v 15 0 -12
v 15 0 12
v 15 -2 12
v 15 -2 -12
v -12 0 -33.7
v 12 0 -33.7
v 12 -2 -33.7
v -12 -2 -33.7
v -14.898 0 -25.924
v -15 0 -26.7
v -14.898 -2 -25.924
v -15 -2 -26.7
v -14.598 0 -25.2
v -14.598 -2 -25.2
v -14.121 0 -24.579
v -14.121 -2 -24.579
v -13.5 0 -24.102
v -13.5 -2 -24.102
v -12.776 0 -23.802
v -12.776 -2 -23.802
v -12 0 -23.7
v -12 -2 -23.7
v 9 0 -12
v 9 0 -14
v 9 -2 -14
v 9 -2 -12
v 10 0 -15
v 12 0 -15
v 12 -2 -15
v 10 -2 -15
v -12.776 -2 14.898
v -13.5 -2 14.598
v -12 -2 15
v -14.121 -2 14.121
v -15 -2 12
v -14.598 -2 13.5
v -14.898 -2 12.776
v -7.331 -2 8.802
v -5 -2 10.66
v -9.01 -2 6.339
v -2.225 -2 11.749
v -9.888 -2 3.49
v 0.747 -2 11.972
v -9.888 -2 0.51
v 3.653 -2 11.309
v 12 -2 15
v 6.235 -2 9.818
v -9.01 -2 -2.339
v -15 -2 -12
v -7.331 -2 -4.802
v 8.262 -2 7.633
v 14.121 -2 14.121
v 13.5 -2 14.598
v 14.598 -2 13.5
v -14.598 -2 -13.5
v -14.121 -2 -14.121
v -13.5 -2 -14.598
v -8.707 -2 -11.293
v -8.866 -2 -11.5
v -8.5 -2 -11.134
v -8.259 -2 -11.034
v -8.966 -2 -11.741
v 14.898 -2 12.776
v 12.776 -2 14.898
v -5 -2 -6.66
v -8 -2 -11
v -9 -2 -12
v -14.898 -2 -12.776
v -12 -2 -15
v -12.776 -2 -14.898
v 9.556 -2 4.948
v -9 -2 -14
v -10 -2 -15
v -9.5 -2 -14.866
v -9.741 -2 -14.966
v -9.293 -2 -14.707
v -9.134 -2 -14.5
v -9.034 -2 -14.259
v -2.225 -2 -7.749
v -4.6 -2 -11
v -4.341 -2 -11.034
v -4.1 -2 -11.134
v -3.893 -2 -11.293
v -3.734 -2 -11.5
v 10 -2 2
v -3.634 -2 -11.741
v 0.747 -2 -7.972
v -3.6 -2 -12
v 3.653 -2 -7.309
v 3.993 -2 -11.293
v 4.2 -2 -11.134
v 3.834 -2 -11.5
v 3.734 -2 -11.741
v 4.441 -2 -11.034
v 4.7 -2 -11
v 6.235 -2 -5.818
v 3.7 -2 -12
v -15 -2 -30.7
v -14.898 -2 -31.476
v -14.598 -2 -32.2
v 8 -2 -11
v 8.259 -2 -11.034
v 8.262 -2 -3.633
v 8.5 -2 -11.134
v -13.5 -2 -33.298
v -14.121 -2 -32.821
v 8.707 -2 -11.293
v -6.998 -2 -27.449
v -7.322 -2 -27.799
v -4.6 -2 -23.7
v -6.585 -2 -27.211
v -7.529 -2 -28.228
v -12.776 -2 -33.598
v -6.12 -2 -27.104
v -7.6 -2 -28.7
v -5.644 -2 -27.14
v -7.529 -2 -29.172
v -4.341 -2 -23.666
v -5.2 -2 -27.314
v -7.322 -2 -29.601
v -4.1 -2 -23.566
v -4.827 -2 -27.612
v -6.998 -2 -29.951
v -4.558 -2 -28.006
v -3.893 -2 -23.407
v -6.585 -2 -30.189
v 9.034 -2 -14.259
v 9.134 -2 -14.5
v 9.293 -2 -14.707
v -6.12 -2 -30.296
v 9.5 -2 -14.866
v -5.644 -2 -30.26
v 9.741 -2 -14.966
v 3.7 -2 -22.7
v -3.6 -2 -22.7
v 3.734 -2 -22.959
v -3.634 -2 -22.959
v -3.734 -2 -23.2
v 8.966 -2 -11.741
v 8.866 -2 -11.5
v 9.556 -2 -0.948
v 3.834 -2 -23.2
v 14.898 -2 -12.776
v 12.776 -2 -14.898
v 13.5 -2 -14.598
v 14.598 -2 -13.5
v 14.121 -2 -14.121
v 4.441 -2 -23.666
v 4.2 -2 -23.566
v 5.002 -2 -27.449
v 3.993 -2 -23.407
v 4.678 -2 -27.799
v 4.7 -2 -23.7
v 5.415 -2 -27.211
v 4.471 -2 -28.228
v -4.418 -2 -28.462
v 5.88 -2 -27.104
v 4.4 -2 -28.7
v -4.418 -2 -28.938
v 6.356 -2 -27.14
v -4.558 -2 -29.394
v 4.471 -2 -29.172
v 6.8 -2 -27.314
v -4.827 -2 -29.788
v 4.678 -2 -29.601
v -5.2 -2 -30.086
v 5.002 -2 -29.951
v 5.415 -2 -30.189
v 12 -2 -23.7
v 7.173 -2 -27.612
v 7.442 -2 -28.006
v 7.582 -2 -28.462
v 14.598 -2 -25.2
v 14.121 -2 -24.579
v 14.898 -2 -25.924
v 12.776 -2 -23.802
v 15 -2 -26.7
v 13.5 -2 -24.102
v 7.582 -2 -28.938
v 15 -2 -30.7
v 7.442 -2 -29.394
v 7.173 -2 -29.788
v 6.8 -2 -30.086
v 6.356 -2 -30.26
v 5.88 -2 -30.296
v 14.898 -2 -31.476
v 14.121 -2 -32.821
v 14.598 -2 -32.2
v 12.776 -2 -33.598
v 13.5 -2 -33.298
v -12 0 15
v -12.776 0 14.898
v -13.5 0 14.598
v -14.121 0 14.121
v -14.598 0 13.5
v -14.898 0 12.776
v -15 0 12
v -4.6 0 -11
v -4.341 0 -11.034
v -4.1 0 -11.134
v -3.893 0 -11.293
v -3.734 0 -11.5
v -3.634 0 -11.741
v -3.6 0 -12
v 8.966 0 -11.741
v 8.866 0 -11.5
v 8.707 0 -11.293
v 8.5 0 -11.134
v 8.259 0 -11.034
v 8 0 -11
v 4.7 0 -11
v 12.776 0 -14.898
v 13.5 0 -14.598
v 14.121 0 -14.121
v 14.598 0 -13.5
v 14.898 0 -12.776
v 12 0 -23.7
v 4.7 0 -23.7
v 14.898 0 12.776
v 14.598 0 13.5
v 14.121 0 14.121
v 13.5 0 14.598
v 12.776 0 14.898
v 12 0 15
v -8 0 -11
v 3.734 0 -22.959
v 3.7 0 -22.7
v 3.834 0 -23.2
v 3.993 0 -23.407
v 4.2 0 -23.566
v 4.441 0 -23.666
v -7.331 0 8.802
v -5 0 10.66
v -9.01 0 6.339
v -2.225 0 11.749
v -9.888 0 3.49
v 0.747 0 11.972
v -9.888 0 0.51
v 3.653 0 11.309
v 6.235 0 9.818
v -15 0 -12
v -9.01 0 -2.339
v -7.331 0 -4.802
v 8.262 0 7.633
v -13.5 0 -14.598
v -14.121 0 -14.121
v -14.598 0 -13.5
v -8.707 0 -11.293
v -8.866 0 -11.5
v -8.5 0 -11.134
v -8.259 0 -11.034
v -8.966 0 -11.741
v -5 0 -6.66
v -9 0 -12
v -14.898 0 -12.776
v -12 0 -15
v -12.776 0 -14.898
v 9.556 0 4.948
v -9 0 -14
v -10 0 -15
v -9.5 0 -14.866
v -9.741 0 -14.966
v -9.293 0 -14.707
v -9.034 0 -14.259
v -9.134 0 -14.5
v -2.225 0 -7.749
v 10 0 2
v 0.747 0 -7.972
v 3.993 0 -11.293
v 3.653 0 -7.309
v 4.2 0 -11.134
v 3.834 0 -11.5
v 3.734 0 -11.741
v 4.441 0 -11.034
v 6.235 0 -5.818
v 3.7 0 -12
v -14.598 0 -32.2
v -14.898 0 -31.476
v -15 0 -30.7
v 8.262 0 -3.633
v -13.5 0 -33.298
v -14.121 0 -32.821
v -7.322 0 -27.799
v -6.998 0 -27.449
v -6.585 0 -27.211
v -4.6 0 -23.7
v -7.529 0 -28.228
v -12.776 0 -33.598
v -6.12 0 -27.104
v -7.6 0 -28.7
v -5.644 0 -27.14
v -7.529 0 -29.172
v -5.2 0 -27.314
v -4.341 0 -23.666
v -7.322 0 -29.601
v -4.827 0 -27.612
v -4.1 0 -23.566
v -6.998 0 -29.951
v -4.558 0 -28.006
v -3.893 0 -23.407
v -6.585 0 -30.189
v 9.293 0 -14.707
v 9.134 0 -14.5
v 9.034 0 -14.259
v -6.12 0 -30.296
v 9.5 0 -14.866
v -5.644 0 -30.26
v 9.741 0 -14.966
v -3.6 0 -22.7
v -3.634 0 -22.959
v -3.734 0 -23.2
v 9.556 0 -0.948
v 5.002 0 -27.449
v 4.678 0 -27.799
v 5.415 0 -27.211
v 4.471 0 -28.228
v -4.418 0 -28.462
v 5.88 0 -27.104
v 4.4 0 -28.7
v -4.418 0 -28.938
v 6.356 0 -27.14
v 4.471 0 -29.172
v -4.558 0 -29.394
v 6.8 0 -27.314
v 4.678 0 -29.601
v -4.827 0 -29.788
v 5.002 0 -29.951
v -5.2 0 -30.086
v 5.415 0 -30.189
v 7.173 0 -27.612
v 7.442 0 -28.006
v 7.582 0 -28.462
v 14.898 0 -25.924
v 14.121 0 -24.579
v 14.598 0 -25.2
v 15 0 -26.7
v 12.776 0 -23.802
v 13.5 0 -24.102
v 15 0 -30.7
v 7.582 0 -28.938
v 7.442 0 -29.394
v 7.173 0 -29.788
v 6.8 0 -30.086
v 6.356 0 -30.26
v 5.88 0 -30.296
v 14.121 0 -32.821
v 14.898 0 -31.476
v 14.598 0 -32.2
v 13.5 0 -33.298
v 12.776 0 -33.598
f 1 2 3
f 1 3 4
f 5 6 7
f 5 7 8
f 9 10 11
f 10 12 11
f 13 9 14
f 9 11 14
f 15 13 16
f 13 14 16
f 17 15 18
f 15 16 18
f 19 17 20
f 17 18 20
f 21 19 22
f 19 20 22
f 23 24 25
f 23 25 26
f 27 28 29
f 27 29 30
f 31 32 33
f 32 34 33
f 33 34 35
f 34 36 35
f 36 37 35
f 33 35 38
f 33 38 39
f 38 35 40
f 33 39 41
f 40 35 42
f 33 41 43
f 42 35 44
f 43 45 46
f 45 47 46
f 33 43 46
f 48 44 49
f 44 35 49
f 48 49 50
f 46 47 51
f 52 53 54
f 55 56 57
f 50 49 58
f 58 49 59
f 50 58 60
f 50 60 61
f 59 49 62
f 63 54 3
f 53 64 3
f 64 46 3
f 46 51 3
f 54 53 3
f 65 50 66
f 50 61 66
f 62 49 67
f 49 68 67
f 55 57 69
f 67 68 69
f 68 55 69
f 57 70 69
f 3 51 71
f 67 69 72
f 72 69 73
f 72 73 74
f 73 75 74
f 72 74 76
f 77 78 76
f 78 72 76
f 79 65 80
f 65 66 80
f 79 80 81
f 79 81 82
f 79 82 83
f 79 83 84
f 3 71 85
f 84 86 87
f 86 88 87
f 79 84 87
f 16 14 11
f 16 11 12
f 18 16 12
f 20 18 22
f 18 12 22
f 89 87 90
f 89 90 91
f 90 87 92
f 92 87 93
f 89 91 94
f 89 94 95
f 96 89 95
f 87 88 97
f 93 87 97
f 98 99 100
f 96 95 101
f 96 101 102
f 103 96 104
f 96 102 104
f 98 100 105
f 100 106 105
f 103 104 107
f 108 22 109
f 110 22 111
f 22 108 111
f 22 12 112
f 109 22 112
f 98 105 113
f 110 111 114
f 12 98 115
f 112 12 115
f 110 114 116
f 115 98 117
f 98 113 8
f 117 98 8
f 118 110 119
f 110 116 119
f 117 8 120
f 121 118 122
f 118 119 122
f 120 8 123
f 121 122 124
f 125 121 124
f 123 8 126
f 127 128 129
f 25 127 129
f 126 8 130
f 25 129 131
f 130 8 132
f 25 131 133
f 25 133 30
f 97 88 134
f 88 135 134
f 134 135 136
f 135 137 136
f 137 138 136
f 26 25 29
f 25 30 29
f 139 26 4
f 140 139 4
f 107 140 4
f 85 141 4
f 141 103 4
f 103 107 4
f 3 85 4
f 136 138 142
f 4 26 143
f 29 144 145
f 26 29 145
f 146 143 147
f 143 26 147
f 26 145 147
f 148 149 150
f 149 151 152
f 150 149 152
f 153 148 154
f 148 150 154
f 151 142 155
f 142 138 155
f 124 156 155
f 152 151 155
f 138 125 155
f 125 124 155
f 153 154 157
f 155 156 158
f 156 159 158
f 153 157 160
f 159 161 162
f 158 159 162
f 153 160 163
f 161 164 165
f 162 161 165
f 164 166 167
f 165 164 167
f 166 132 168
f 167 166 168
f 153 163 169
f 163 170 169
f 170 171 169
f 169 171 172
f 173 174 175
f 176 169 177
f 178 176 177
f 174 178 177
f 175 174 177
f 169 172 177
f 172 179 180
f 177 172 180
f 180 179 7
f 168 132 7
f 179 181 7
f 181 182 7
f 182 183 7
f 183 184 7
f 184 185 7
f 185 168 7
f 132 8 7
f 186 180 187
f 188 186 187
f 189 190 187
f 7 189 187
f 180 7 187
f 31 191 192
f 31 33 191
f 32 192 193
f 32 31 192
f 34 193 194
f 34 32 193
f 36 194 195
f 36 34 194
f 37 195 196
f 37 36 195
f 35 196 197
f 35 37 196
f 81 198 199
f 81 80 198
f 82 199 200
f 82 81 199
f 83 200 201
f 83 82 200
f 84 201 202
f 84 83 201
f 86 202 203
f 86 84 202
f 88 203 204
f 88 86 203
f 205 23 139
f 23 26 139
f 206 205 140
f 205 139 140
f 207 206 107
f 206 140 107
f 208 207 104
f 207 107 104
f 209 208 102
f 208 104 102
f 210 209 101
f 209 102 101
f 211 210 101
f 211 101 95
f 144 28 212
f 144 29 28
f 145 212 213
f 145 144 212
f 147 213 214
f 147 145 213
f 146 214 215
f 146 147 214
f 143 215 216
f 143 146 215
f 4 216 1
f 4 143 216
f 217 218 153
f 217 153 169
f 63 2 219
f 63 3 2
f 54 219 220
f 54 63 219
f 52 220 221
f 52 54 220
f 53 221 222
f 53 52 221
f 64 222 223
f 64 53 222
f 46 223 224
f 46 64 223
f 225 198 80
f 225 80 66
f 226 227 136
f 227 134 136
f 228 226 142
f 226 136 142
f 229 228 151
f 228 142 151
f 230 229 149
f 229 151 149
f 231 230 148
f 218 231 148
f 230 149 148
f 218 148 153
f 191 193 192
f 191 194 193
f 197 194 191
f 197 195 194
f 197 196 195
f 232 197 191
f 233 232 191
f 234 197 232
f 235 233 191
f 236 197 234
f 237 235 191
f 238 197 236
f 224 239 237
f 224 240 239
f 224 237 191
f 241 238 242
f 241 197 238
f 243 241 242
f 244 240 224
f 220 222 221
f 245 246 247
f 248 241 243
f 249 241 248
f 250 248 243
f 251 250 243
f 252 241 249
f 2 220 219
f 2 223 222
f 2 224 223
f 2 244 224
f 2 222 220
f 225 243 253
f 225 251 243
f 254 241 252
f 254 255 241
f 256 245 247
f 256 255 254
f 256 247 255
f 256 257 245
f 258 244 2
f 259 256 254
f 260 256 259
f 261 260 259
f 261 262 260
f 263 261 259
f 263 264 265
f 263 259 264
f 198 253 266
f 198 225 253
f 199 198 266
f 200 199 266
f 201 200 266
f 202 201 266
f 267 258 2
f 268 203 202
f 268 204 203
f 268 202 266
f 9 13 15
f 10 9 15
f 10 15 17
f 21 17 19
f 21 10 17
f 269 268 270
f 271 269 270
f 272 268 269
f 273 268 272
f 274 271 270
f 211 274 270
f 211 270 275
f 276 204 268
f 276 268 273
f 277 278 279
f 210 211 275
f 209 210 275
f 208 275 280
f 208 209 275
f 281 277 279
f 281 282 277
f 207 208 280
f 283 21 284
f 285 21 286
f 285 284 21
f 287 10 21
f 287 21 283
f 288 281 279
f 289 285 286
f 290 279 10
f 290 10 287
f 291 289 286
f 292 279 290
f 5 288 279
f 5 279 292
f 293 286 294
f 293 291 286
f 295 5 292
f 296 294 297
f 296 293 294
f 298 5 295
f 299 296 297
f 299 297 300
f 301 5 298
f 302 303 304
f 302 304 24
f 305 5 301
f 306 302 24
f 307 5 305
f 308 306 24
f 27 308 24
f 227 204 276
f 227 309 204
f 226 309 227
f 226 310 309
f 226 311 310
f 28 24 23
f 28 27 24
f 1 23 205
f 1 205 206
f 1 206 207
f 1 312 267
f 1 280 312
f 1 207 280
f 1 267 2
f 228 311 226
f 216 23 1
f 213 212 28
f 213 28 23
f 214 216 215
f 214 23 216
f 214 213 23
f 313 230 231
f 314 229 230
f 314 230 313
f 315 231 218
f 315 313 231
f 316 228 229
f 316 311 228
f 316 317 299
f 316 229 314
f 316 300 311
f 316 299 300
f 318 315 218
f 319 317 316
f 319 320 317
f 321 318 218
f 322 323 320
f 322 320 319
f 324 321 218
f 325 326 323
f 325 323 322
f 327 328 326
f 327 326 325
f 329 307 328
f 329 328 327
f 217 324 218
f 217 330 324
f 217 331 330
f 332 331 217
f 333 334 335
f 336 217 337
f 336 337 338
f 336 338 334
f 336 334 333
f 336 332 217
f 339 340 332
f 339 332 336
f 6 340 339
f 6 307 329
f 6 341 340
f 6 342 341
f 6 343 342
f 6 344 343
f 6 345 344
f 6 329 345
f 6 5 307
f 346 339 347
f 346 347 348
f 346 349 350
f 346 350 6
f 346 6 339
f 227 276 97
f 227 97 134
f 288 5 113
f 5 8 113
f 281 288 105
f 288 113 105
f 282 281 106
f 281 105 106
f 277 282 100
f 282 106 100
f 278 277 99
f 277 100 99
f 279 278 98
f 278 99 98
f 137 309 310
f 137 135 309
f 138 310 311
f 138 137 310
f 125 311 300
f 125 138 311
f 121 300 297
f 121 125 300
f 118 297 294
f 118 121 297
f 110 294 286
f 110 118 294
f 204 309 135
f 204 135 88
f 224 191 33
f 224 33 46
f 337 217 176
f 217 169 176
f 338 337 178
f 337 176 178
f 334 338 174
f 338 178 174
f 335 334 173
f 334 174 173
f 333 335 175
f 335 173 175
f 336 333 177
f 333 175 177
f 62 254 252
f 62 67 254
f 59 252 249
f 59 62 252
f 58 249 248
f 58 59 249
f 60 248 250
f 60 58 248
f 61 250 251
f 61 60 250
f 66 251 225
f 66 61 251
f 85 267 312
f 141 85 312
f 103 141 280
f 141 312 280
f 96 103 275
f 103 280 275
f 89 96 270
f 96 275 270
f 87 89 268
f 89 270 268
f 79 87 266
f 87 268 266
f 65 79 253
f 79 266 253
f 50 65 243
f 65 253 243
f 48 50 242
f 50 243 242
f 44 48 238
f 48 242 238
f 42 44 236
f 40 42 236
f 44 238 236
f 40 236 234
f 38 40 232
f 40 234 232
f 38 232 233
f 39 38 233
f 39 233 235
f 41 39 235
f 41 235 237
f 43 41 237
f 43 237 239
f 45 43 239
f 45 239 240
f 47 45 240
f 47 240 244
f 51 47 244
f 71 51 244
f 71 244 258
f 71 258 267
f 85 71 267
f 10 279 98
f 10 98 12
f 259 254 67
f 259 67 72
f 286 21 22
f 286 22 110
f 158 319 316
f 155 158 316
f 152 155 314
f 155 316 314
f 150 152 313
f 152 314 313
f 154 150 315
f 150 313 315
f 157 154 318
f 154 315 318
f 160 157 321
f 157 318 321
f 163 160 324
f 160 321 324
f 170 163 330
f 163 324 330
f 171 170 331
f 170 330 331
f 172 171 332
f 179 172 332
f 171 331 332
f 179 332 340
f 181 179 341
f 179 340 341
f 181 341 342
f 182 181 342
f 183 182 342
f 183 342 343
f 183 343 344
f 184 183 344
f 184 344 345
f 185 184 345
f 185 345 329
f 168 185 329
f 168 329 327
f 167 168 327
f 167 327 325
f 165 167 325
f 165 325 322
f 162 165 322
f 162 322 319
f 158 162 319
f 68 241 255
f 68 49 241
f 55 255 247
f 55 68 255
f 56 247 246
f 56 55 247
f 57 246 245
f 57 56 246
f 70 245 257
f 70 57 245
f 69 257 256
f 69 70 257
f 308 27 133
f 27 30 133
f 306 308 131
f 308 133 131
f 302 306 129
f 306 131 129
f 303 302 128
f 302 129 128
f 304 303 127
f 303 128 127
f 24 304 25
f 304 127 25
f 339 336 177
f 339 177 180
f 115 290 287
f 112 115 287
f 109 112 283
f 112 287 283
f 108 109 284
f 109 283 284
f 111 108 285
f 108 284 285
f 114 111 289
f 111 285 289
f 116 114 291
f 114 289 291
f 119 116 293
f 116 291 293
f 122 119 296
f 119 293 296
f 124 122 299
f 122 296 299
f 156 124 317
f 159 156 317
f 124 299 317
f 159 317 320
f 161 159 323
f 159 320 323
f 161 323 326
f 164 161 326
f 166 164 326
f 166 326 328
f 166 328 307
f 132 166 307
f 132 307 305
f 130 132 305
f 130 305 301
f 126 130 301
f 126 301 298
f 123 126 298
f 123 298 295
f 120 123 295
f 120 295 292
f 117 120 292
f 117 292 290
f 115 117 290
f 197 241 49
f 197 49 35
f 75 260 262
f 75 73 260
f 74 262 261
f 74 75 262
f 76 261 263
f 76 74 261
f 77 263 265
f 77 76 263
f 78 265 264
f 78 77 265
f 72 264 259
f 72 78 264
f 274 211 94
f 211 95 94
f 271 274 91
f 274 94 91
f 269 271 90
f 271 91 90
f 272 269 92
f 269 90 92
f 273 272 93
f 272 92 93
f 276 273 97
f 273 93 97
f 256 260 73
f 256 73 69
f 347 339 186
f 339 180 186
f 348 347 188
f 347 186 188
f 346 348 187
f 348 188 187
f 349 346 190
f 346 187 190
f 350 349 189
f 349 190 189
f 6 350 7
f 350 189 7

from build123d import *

# Parameters (mm, degrees)
SM_BASE_FLANGE_1_DEPTH = 2
CUT_EXTRUDE_1_DEPTH    = 10
FILLET_1_R             = 3
FILLET_2_R             = 1
CUT_EXTRUDE_3_DEPTH    = 10


# Sheet-metal steps are written as plain solids
with BuildPart() as part:
    # Sketch 1 → 基体-法兰1 (new body)
    with BuildSketch(Plane(origin=(0, 0, 0), x_dir=(1, 0, 0), z_dir=(0, 1, 0))):
        Polygon((15, 15), (9, 15), (9, 11), (3.7, 11), (3.7, 15), (3.7, 23.7), (15, 23.7), (15, 33.7), (-15, 33.7), (-15, 23.7), (-3.6, 23.7), (-3.6, 15), (-3.6, 11), (-9, 11), (-9, 15), (-15, 15), (-15, -15), (15, -15), align=None)
    extrude(amount=-SM_BASE_FLANGE_1_DEPTH)

    # 草图6 → 切除-拉伸1 (cut)
    with BuildSketch(Plane(origin=(0, 0, 0), x_dir=(1, 0, 0), z_dir=(0, 1, 0))):
        with BuildLine():
            Line((-7.6, 28.7), (-6, 28.7))
            Line((-6, 28.7), (-4.4, 28.7))
            ThreePointArc((-4.4, 28.7), (-6, 30.3), (-7.6, 28.7))
        make_face()
        with BuildLine():
            Line((-4.4, 28.7), (-6, 28.7))
            Line((-6, 28.7), (-7.6, 28.7))
            ThreePointArc((-7.6, 28.7), (-6, 27.1), (-4.4, 28.7))
        make_face()
        with BuildLine():
            ThreePointArc((7.6, 28.7), (6, 30.3), (4.4, 28.7))
            Line((4.4, 28.7), (6, 28.7))
            Line((6, 28.7), (7.6, 28.7))
        make_face()
        with BuildLine():
            Line((6, 28.7), (4.4, 28.7))
            ThreePointArc((4.4, 28.7), (6, 27.1), (7.6, 28.7))
            Line((7.6, 28.7), (6, 28.7))
        make_face()
    extrude(amount=-CUT_EXTRUDE_1_DEPTH, mode=Mode.SUBTRACT)

    # 圆角1
    fillet_1_edges = [part.edges().sort_by_distance(p)[0] for p in [
        (15, -1, 15),
        (-15, -1, 15),
        (-15, -1, -15),
        (-15, -1, -23.7),
        (-15, -1, -33.7),
        (15, -1, -33.7),
        (15, -1, -23.7),
        (15, -1, -15),
    ]]
    fillet(fillet_1_edges, radius=FILLET_1_R)

    # 圆角2
    fillet_2_edges = [part.edges().sort_by_distance(p)[0] for p in [
        (-9, -1, -15),
        (-9, -1, -11),
        (-3.6, -1, -11),
        (-3.6, -1, -23.7),
        (3.7, -1, -23.7),
        (3.7, -1, -11),
        (9, -1, -11),
        (9, -1, -15),
    ]]
    fillet(fillet_2_edges, radius=FILLET_2_R)

    # 草图7 → 切除-拉伸3 (cut)
    with BuildSketch(Plane(origin=(0, 0, 0), x_dir=(1, 0, 0), z_dir=(0, 1, 0))):
        with BuildLine():
            ThreePointArc((-10, -2), (0, -12), (10, -2))
            Line((10, -2), (-10, -2))
        make_face()
        with BuildLine():
            Line((-10, -2), (10, -2))
            ThreePointArc((10, -2), (0, 8), (-10, -2))
        make_face()
    extrude(amount=-CUT_EXTRUDE_3_DEPTH, mode=Mode.SUBTRACT)


solid = part.part
